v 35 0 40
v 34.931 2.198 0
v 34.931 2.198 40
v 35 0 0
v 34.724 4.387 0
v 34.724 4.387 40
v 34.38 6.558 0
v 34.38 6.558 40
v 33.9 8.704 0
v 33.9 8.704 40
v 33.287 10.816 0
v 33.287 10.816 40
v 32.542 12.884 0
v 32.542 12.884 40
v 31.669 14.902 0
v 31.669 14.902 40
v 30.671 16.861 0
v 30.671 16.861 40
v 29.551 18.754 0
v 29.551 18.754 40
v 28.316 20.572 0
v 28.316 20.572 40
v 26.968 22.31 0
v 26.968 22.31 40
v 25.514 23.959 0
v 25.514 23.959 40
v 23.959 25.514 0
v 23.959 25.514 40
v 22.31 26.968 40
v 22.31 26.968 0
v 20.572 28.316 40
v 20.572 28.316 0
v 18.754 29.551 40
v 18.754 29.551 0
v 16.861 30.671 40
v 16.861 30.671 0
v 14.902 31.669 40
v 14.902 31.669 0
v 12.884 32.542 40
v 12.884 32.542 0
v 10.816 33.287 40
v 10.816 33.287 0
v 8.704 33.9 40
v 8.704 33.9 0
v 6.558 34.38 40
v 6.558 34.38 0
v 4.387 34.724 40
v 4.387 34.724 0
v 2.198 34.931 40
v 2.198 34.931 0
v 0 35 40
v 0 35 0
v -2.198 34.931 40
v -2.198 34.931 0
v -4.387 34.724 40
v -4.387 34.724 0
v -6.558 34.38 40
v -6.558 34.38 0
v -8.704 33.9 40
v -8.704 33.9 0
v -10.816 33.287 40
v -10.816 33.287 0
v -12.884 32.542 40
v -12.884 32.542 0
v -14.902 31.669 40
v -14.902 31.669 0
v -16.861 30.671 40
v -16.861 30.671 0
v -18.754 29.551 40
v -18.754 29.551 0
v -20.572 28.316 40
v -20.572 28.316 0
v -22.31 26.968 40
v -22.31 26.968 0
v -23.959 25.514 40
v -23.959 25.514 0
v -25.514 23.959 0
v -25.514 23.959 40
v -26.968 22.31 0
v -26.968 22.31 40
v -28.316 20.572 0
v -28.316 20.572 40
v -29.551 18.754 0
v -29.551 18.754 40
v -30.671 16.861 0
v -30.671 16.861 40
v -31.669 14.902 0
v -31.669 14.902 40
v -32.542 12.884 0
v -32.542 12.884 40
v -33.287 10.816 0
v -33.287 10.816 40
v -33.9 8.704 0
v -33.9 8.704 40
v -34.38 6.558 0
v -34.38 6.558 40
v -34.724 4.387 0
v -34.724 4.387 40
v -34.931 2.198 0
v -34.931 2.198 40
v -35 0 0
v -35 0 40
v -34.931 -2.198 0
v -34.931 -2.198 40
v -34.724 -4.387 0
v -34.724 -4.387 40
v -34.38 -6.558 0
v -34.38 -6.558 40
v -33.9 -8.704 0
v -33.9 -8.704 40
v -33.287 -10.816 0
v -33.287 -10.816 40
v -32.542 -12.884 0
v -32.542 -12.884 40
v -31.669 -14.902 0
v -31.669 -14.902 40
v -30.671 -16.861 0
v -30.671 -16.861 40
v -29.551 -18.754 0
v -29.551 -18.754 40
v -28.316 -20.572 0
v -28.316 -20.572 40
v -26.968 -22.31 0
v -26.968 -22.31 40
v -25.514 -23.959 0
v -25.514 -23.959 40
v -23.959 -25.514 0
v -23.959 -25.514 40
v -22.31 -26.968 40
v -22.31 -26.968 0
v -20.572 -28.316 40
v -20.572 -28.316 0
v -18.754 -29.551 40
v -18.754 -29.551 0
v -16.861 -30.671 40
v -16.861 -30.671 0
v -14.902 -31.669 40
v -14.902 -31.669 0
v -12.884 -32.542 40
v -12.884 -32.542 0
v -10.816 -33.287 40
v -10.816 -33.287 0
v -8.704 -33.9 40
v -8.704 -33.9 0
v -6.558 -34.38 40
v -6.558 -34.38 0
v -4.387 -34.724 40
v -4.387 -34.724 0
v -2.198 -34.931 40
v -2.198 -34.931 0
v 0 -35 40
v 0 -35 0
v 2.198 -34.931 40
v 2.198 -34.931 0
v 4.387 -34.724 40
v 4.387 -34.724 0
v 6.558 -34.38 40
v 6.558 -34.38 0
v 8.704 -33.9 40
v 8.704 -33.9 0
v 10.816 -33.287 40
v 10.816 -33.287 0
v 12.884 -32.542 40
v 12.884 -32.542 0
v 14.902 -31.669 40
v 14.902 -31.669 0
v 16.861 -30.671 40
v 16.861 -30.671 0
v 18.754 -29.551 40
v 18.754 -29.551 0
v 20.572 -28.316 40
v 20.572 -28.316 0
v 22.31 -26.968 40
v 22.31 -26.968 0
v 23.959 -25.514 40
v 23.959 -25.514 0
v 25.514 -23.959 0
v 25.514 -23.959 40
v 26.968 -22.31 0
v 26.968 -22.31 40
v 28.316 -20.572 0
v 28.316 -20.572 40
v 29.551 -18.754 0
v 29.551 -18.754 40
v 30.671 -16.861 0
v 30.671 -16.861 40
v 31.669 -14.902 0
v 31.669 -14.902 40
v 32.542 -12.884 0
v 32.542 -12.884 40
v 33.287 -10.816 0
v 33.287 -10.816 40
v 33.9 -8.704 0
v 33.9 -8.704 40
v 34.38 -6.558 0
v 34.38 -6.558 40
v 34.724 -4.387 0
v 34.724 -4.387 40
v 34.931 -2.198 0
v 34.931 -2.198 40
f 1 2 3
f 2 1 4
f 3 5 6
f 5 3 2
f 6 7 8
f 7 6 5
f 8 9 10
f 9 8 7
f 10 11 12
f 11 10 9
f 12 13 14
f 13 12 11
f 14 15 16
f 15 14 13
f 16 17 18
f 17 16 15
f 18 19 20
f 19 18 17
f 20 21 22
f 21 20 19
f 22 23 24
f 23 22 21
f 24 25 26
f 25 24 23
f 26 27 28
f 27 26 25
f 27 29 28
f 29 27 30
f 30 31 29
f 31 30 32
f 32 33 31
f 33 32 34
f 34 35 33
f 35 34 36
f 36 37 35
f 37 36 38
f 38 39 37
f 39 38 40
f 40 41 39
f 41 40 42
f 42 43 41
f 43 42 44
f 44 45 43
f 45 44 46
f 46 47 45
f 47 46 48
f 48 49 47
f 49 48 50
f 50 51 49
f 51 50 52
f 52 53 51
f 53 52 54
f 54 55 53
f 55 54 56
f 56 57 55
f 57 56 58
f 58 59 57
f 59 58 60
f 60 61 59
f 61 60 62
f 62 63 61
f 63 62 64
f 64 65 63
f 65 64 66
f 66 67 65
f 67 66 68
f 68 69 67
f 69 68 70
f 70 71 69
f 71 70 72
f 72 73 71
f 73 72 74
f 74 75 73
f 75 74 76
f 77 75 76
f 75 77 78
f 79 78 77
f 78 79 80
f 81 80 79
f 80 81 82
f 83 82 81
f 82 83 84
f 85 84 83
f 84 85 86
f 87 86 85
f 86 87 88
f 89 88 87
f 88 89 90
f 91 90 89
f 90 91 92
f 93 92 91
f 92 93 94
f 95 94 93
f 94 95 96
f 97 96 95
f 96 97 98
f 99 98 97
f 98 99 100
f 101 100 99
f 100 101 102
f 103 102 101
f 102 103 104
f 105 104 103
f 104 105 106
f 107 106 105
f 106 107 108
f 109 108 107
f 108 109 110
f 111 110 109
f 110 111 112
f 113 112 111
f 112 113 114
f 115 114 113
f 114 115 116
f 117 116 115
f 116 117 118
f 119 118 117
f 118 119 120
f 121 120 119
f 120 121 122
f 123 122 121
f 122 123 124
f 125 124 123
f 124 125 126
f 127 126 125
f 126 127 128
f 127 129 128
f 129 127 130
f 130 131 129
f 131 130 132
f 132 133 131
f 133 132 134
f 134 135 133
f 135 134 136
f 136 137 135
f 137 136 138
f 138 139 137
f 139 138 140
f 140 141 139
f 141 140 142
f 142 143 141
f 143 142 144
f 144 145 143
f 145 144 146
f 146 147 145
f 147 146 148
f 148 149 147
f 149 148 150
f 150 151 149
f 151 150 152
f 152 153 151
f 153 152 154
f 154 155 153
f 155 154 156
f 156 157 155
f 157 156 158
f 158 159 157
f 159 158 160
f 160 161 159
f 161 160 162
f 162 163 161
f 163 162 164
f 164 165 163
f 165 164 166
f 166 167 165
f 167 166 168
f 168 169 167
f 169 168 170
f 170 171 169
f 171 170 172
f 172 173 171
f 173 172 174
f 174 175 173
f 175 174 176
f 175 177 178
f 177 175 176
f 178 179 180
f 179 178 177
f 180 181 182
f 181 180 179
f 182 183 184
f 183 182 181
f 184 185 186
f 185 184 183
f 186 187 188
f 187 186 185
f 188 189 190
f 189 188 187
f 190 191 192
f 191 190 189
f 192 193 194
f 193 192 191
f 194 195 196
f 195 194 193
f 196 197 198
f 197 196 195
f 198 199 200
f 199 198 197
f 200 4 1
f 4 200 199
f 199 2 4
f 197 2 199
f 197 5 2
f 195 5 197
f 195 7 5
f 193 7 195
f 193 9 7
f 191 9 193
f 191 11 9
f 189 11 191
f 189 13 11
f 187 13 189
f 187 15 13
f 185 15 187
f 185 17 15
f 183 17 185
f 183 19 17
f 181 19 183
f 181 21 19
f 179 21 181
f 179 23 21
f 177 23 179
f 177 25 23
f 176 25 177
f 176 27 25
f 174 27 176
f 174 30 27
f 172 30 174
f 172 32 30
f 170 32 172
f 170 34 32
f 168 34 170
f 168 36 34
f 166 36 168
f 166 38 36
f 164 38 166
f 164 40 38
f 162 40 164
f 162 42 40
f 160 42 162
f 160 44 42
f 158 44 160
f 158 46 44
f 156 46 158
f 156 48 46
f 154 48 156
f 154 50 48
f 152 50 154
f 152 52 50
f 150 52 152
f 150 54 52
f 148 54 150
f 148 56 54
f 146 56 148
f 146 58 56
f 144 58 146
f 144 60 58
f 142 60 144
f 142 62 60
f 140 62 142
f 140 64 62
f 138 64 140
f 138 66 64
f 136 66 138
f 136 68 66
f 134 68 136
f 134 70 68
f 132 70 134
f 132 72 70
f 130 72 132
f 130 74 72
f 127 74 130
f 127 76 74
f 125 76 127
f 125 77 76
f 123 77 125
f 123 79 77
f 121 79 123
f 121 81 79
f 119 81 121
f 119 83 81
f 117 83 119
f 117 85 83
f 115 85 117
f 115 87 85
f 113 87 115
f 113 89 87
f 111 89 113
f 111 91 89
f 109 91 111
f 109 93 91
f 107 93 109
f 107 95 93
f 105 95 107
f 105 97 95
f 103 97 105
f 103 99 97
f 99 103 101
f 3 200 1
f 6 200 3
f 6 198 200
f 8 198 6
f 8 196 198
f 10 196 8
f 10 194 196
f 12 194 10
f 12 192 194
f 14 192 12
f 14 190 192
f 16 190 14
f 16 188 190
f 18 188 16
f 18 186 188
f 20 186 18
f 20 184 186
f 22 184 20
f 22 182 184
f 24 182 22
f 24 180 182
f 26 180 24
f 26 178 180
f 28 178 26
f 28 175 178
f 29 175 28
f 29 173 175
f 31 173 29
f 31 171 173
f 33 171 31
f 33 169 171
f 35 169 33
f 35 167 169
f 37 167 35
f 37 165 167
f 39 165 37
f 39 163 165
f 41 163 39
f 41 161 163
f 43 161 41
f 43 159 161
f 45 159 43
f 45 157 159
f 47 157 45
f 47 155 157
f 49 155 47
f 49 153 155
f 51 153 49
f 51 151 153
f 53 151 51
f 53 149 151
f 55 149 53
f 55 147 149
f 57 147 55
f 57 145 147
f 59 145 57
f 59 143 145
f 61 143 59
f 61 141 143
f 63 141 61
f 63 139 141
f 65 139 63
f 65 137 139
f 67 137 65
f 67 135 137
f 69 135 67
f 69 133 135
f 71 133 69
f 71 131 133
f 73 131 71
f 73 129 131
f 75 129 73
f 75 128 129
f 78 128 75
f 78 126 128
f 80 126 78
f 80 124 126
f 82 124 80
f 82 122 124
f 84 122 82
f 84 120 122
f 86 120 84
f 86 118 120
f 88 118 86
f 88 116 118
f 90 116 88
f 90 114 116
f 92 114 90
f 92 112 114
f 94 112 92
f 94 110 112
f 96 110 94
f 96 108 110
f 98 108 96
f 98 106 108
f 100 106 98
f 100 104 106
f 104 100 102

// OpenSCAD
height = 40;
diameter = 70;

cylinder(h = height, d = diameter, center = false, $fn = 100);
